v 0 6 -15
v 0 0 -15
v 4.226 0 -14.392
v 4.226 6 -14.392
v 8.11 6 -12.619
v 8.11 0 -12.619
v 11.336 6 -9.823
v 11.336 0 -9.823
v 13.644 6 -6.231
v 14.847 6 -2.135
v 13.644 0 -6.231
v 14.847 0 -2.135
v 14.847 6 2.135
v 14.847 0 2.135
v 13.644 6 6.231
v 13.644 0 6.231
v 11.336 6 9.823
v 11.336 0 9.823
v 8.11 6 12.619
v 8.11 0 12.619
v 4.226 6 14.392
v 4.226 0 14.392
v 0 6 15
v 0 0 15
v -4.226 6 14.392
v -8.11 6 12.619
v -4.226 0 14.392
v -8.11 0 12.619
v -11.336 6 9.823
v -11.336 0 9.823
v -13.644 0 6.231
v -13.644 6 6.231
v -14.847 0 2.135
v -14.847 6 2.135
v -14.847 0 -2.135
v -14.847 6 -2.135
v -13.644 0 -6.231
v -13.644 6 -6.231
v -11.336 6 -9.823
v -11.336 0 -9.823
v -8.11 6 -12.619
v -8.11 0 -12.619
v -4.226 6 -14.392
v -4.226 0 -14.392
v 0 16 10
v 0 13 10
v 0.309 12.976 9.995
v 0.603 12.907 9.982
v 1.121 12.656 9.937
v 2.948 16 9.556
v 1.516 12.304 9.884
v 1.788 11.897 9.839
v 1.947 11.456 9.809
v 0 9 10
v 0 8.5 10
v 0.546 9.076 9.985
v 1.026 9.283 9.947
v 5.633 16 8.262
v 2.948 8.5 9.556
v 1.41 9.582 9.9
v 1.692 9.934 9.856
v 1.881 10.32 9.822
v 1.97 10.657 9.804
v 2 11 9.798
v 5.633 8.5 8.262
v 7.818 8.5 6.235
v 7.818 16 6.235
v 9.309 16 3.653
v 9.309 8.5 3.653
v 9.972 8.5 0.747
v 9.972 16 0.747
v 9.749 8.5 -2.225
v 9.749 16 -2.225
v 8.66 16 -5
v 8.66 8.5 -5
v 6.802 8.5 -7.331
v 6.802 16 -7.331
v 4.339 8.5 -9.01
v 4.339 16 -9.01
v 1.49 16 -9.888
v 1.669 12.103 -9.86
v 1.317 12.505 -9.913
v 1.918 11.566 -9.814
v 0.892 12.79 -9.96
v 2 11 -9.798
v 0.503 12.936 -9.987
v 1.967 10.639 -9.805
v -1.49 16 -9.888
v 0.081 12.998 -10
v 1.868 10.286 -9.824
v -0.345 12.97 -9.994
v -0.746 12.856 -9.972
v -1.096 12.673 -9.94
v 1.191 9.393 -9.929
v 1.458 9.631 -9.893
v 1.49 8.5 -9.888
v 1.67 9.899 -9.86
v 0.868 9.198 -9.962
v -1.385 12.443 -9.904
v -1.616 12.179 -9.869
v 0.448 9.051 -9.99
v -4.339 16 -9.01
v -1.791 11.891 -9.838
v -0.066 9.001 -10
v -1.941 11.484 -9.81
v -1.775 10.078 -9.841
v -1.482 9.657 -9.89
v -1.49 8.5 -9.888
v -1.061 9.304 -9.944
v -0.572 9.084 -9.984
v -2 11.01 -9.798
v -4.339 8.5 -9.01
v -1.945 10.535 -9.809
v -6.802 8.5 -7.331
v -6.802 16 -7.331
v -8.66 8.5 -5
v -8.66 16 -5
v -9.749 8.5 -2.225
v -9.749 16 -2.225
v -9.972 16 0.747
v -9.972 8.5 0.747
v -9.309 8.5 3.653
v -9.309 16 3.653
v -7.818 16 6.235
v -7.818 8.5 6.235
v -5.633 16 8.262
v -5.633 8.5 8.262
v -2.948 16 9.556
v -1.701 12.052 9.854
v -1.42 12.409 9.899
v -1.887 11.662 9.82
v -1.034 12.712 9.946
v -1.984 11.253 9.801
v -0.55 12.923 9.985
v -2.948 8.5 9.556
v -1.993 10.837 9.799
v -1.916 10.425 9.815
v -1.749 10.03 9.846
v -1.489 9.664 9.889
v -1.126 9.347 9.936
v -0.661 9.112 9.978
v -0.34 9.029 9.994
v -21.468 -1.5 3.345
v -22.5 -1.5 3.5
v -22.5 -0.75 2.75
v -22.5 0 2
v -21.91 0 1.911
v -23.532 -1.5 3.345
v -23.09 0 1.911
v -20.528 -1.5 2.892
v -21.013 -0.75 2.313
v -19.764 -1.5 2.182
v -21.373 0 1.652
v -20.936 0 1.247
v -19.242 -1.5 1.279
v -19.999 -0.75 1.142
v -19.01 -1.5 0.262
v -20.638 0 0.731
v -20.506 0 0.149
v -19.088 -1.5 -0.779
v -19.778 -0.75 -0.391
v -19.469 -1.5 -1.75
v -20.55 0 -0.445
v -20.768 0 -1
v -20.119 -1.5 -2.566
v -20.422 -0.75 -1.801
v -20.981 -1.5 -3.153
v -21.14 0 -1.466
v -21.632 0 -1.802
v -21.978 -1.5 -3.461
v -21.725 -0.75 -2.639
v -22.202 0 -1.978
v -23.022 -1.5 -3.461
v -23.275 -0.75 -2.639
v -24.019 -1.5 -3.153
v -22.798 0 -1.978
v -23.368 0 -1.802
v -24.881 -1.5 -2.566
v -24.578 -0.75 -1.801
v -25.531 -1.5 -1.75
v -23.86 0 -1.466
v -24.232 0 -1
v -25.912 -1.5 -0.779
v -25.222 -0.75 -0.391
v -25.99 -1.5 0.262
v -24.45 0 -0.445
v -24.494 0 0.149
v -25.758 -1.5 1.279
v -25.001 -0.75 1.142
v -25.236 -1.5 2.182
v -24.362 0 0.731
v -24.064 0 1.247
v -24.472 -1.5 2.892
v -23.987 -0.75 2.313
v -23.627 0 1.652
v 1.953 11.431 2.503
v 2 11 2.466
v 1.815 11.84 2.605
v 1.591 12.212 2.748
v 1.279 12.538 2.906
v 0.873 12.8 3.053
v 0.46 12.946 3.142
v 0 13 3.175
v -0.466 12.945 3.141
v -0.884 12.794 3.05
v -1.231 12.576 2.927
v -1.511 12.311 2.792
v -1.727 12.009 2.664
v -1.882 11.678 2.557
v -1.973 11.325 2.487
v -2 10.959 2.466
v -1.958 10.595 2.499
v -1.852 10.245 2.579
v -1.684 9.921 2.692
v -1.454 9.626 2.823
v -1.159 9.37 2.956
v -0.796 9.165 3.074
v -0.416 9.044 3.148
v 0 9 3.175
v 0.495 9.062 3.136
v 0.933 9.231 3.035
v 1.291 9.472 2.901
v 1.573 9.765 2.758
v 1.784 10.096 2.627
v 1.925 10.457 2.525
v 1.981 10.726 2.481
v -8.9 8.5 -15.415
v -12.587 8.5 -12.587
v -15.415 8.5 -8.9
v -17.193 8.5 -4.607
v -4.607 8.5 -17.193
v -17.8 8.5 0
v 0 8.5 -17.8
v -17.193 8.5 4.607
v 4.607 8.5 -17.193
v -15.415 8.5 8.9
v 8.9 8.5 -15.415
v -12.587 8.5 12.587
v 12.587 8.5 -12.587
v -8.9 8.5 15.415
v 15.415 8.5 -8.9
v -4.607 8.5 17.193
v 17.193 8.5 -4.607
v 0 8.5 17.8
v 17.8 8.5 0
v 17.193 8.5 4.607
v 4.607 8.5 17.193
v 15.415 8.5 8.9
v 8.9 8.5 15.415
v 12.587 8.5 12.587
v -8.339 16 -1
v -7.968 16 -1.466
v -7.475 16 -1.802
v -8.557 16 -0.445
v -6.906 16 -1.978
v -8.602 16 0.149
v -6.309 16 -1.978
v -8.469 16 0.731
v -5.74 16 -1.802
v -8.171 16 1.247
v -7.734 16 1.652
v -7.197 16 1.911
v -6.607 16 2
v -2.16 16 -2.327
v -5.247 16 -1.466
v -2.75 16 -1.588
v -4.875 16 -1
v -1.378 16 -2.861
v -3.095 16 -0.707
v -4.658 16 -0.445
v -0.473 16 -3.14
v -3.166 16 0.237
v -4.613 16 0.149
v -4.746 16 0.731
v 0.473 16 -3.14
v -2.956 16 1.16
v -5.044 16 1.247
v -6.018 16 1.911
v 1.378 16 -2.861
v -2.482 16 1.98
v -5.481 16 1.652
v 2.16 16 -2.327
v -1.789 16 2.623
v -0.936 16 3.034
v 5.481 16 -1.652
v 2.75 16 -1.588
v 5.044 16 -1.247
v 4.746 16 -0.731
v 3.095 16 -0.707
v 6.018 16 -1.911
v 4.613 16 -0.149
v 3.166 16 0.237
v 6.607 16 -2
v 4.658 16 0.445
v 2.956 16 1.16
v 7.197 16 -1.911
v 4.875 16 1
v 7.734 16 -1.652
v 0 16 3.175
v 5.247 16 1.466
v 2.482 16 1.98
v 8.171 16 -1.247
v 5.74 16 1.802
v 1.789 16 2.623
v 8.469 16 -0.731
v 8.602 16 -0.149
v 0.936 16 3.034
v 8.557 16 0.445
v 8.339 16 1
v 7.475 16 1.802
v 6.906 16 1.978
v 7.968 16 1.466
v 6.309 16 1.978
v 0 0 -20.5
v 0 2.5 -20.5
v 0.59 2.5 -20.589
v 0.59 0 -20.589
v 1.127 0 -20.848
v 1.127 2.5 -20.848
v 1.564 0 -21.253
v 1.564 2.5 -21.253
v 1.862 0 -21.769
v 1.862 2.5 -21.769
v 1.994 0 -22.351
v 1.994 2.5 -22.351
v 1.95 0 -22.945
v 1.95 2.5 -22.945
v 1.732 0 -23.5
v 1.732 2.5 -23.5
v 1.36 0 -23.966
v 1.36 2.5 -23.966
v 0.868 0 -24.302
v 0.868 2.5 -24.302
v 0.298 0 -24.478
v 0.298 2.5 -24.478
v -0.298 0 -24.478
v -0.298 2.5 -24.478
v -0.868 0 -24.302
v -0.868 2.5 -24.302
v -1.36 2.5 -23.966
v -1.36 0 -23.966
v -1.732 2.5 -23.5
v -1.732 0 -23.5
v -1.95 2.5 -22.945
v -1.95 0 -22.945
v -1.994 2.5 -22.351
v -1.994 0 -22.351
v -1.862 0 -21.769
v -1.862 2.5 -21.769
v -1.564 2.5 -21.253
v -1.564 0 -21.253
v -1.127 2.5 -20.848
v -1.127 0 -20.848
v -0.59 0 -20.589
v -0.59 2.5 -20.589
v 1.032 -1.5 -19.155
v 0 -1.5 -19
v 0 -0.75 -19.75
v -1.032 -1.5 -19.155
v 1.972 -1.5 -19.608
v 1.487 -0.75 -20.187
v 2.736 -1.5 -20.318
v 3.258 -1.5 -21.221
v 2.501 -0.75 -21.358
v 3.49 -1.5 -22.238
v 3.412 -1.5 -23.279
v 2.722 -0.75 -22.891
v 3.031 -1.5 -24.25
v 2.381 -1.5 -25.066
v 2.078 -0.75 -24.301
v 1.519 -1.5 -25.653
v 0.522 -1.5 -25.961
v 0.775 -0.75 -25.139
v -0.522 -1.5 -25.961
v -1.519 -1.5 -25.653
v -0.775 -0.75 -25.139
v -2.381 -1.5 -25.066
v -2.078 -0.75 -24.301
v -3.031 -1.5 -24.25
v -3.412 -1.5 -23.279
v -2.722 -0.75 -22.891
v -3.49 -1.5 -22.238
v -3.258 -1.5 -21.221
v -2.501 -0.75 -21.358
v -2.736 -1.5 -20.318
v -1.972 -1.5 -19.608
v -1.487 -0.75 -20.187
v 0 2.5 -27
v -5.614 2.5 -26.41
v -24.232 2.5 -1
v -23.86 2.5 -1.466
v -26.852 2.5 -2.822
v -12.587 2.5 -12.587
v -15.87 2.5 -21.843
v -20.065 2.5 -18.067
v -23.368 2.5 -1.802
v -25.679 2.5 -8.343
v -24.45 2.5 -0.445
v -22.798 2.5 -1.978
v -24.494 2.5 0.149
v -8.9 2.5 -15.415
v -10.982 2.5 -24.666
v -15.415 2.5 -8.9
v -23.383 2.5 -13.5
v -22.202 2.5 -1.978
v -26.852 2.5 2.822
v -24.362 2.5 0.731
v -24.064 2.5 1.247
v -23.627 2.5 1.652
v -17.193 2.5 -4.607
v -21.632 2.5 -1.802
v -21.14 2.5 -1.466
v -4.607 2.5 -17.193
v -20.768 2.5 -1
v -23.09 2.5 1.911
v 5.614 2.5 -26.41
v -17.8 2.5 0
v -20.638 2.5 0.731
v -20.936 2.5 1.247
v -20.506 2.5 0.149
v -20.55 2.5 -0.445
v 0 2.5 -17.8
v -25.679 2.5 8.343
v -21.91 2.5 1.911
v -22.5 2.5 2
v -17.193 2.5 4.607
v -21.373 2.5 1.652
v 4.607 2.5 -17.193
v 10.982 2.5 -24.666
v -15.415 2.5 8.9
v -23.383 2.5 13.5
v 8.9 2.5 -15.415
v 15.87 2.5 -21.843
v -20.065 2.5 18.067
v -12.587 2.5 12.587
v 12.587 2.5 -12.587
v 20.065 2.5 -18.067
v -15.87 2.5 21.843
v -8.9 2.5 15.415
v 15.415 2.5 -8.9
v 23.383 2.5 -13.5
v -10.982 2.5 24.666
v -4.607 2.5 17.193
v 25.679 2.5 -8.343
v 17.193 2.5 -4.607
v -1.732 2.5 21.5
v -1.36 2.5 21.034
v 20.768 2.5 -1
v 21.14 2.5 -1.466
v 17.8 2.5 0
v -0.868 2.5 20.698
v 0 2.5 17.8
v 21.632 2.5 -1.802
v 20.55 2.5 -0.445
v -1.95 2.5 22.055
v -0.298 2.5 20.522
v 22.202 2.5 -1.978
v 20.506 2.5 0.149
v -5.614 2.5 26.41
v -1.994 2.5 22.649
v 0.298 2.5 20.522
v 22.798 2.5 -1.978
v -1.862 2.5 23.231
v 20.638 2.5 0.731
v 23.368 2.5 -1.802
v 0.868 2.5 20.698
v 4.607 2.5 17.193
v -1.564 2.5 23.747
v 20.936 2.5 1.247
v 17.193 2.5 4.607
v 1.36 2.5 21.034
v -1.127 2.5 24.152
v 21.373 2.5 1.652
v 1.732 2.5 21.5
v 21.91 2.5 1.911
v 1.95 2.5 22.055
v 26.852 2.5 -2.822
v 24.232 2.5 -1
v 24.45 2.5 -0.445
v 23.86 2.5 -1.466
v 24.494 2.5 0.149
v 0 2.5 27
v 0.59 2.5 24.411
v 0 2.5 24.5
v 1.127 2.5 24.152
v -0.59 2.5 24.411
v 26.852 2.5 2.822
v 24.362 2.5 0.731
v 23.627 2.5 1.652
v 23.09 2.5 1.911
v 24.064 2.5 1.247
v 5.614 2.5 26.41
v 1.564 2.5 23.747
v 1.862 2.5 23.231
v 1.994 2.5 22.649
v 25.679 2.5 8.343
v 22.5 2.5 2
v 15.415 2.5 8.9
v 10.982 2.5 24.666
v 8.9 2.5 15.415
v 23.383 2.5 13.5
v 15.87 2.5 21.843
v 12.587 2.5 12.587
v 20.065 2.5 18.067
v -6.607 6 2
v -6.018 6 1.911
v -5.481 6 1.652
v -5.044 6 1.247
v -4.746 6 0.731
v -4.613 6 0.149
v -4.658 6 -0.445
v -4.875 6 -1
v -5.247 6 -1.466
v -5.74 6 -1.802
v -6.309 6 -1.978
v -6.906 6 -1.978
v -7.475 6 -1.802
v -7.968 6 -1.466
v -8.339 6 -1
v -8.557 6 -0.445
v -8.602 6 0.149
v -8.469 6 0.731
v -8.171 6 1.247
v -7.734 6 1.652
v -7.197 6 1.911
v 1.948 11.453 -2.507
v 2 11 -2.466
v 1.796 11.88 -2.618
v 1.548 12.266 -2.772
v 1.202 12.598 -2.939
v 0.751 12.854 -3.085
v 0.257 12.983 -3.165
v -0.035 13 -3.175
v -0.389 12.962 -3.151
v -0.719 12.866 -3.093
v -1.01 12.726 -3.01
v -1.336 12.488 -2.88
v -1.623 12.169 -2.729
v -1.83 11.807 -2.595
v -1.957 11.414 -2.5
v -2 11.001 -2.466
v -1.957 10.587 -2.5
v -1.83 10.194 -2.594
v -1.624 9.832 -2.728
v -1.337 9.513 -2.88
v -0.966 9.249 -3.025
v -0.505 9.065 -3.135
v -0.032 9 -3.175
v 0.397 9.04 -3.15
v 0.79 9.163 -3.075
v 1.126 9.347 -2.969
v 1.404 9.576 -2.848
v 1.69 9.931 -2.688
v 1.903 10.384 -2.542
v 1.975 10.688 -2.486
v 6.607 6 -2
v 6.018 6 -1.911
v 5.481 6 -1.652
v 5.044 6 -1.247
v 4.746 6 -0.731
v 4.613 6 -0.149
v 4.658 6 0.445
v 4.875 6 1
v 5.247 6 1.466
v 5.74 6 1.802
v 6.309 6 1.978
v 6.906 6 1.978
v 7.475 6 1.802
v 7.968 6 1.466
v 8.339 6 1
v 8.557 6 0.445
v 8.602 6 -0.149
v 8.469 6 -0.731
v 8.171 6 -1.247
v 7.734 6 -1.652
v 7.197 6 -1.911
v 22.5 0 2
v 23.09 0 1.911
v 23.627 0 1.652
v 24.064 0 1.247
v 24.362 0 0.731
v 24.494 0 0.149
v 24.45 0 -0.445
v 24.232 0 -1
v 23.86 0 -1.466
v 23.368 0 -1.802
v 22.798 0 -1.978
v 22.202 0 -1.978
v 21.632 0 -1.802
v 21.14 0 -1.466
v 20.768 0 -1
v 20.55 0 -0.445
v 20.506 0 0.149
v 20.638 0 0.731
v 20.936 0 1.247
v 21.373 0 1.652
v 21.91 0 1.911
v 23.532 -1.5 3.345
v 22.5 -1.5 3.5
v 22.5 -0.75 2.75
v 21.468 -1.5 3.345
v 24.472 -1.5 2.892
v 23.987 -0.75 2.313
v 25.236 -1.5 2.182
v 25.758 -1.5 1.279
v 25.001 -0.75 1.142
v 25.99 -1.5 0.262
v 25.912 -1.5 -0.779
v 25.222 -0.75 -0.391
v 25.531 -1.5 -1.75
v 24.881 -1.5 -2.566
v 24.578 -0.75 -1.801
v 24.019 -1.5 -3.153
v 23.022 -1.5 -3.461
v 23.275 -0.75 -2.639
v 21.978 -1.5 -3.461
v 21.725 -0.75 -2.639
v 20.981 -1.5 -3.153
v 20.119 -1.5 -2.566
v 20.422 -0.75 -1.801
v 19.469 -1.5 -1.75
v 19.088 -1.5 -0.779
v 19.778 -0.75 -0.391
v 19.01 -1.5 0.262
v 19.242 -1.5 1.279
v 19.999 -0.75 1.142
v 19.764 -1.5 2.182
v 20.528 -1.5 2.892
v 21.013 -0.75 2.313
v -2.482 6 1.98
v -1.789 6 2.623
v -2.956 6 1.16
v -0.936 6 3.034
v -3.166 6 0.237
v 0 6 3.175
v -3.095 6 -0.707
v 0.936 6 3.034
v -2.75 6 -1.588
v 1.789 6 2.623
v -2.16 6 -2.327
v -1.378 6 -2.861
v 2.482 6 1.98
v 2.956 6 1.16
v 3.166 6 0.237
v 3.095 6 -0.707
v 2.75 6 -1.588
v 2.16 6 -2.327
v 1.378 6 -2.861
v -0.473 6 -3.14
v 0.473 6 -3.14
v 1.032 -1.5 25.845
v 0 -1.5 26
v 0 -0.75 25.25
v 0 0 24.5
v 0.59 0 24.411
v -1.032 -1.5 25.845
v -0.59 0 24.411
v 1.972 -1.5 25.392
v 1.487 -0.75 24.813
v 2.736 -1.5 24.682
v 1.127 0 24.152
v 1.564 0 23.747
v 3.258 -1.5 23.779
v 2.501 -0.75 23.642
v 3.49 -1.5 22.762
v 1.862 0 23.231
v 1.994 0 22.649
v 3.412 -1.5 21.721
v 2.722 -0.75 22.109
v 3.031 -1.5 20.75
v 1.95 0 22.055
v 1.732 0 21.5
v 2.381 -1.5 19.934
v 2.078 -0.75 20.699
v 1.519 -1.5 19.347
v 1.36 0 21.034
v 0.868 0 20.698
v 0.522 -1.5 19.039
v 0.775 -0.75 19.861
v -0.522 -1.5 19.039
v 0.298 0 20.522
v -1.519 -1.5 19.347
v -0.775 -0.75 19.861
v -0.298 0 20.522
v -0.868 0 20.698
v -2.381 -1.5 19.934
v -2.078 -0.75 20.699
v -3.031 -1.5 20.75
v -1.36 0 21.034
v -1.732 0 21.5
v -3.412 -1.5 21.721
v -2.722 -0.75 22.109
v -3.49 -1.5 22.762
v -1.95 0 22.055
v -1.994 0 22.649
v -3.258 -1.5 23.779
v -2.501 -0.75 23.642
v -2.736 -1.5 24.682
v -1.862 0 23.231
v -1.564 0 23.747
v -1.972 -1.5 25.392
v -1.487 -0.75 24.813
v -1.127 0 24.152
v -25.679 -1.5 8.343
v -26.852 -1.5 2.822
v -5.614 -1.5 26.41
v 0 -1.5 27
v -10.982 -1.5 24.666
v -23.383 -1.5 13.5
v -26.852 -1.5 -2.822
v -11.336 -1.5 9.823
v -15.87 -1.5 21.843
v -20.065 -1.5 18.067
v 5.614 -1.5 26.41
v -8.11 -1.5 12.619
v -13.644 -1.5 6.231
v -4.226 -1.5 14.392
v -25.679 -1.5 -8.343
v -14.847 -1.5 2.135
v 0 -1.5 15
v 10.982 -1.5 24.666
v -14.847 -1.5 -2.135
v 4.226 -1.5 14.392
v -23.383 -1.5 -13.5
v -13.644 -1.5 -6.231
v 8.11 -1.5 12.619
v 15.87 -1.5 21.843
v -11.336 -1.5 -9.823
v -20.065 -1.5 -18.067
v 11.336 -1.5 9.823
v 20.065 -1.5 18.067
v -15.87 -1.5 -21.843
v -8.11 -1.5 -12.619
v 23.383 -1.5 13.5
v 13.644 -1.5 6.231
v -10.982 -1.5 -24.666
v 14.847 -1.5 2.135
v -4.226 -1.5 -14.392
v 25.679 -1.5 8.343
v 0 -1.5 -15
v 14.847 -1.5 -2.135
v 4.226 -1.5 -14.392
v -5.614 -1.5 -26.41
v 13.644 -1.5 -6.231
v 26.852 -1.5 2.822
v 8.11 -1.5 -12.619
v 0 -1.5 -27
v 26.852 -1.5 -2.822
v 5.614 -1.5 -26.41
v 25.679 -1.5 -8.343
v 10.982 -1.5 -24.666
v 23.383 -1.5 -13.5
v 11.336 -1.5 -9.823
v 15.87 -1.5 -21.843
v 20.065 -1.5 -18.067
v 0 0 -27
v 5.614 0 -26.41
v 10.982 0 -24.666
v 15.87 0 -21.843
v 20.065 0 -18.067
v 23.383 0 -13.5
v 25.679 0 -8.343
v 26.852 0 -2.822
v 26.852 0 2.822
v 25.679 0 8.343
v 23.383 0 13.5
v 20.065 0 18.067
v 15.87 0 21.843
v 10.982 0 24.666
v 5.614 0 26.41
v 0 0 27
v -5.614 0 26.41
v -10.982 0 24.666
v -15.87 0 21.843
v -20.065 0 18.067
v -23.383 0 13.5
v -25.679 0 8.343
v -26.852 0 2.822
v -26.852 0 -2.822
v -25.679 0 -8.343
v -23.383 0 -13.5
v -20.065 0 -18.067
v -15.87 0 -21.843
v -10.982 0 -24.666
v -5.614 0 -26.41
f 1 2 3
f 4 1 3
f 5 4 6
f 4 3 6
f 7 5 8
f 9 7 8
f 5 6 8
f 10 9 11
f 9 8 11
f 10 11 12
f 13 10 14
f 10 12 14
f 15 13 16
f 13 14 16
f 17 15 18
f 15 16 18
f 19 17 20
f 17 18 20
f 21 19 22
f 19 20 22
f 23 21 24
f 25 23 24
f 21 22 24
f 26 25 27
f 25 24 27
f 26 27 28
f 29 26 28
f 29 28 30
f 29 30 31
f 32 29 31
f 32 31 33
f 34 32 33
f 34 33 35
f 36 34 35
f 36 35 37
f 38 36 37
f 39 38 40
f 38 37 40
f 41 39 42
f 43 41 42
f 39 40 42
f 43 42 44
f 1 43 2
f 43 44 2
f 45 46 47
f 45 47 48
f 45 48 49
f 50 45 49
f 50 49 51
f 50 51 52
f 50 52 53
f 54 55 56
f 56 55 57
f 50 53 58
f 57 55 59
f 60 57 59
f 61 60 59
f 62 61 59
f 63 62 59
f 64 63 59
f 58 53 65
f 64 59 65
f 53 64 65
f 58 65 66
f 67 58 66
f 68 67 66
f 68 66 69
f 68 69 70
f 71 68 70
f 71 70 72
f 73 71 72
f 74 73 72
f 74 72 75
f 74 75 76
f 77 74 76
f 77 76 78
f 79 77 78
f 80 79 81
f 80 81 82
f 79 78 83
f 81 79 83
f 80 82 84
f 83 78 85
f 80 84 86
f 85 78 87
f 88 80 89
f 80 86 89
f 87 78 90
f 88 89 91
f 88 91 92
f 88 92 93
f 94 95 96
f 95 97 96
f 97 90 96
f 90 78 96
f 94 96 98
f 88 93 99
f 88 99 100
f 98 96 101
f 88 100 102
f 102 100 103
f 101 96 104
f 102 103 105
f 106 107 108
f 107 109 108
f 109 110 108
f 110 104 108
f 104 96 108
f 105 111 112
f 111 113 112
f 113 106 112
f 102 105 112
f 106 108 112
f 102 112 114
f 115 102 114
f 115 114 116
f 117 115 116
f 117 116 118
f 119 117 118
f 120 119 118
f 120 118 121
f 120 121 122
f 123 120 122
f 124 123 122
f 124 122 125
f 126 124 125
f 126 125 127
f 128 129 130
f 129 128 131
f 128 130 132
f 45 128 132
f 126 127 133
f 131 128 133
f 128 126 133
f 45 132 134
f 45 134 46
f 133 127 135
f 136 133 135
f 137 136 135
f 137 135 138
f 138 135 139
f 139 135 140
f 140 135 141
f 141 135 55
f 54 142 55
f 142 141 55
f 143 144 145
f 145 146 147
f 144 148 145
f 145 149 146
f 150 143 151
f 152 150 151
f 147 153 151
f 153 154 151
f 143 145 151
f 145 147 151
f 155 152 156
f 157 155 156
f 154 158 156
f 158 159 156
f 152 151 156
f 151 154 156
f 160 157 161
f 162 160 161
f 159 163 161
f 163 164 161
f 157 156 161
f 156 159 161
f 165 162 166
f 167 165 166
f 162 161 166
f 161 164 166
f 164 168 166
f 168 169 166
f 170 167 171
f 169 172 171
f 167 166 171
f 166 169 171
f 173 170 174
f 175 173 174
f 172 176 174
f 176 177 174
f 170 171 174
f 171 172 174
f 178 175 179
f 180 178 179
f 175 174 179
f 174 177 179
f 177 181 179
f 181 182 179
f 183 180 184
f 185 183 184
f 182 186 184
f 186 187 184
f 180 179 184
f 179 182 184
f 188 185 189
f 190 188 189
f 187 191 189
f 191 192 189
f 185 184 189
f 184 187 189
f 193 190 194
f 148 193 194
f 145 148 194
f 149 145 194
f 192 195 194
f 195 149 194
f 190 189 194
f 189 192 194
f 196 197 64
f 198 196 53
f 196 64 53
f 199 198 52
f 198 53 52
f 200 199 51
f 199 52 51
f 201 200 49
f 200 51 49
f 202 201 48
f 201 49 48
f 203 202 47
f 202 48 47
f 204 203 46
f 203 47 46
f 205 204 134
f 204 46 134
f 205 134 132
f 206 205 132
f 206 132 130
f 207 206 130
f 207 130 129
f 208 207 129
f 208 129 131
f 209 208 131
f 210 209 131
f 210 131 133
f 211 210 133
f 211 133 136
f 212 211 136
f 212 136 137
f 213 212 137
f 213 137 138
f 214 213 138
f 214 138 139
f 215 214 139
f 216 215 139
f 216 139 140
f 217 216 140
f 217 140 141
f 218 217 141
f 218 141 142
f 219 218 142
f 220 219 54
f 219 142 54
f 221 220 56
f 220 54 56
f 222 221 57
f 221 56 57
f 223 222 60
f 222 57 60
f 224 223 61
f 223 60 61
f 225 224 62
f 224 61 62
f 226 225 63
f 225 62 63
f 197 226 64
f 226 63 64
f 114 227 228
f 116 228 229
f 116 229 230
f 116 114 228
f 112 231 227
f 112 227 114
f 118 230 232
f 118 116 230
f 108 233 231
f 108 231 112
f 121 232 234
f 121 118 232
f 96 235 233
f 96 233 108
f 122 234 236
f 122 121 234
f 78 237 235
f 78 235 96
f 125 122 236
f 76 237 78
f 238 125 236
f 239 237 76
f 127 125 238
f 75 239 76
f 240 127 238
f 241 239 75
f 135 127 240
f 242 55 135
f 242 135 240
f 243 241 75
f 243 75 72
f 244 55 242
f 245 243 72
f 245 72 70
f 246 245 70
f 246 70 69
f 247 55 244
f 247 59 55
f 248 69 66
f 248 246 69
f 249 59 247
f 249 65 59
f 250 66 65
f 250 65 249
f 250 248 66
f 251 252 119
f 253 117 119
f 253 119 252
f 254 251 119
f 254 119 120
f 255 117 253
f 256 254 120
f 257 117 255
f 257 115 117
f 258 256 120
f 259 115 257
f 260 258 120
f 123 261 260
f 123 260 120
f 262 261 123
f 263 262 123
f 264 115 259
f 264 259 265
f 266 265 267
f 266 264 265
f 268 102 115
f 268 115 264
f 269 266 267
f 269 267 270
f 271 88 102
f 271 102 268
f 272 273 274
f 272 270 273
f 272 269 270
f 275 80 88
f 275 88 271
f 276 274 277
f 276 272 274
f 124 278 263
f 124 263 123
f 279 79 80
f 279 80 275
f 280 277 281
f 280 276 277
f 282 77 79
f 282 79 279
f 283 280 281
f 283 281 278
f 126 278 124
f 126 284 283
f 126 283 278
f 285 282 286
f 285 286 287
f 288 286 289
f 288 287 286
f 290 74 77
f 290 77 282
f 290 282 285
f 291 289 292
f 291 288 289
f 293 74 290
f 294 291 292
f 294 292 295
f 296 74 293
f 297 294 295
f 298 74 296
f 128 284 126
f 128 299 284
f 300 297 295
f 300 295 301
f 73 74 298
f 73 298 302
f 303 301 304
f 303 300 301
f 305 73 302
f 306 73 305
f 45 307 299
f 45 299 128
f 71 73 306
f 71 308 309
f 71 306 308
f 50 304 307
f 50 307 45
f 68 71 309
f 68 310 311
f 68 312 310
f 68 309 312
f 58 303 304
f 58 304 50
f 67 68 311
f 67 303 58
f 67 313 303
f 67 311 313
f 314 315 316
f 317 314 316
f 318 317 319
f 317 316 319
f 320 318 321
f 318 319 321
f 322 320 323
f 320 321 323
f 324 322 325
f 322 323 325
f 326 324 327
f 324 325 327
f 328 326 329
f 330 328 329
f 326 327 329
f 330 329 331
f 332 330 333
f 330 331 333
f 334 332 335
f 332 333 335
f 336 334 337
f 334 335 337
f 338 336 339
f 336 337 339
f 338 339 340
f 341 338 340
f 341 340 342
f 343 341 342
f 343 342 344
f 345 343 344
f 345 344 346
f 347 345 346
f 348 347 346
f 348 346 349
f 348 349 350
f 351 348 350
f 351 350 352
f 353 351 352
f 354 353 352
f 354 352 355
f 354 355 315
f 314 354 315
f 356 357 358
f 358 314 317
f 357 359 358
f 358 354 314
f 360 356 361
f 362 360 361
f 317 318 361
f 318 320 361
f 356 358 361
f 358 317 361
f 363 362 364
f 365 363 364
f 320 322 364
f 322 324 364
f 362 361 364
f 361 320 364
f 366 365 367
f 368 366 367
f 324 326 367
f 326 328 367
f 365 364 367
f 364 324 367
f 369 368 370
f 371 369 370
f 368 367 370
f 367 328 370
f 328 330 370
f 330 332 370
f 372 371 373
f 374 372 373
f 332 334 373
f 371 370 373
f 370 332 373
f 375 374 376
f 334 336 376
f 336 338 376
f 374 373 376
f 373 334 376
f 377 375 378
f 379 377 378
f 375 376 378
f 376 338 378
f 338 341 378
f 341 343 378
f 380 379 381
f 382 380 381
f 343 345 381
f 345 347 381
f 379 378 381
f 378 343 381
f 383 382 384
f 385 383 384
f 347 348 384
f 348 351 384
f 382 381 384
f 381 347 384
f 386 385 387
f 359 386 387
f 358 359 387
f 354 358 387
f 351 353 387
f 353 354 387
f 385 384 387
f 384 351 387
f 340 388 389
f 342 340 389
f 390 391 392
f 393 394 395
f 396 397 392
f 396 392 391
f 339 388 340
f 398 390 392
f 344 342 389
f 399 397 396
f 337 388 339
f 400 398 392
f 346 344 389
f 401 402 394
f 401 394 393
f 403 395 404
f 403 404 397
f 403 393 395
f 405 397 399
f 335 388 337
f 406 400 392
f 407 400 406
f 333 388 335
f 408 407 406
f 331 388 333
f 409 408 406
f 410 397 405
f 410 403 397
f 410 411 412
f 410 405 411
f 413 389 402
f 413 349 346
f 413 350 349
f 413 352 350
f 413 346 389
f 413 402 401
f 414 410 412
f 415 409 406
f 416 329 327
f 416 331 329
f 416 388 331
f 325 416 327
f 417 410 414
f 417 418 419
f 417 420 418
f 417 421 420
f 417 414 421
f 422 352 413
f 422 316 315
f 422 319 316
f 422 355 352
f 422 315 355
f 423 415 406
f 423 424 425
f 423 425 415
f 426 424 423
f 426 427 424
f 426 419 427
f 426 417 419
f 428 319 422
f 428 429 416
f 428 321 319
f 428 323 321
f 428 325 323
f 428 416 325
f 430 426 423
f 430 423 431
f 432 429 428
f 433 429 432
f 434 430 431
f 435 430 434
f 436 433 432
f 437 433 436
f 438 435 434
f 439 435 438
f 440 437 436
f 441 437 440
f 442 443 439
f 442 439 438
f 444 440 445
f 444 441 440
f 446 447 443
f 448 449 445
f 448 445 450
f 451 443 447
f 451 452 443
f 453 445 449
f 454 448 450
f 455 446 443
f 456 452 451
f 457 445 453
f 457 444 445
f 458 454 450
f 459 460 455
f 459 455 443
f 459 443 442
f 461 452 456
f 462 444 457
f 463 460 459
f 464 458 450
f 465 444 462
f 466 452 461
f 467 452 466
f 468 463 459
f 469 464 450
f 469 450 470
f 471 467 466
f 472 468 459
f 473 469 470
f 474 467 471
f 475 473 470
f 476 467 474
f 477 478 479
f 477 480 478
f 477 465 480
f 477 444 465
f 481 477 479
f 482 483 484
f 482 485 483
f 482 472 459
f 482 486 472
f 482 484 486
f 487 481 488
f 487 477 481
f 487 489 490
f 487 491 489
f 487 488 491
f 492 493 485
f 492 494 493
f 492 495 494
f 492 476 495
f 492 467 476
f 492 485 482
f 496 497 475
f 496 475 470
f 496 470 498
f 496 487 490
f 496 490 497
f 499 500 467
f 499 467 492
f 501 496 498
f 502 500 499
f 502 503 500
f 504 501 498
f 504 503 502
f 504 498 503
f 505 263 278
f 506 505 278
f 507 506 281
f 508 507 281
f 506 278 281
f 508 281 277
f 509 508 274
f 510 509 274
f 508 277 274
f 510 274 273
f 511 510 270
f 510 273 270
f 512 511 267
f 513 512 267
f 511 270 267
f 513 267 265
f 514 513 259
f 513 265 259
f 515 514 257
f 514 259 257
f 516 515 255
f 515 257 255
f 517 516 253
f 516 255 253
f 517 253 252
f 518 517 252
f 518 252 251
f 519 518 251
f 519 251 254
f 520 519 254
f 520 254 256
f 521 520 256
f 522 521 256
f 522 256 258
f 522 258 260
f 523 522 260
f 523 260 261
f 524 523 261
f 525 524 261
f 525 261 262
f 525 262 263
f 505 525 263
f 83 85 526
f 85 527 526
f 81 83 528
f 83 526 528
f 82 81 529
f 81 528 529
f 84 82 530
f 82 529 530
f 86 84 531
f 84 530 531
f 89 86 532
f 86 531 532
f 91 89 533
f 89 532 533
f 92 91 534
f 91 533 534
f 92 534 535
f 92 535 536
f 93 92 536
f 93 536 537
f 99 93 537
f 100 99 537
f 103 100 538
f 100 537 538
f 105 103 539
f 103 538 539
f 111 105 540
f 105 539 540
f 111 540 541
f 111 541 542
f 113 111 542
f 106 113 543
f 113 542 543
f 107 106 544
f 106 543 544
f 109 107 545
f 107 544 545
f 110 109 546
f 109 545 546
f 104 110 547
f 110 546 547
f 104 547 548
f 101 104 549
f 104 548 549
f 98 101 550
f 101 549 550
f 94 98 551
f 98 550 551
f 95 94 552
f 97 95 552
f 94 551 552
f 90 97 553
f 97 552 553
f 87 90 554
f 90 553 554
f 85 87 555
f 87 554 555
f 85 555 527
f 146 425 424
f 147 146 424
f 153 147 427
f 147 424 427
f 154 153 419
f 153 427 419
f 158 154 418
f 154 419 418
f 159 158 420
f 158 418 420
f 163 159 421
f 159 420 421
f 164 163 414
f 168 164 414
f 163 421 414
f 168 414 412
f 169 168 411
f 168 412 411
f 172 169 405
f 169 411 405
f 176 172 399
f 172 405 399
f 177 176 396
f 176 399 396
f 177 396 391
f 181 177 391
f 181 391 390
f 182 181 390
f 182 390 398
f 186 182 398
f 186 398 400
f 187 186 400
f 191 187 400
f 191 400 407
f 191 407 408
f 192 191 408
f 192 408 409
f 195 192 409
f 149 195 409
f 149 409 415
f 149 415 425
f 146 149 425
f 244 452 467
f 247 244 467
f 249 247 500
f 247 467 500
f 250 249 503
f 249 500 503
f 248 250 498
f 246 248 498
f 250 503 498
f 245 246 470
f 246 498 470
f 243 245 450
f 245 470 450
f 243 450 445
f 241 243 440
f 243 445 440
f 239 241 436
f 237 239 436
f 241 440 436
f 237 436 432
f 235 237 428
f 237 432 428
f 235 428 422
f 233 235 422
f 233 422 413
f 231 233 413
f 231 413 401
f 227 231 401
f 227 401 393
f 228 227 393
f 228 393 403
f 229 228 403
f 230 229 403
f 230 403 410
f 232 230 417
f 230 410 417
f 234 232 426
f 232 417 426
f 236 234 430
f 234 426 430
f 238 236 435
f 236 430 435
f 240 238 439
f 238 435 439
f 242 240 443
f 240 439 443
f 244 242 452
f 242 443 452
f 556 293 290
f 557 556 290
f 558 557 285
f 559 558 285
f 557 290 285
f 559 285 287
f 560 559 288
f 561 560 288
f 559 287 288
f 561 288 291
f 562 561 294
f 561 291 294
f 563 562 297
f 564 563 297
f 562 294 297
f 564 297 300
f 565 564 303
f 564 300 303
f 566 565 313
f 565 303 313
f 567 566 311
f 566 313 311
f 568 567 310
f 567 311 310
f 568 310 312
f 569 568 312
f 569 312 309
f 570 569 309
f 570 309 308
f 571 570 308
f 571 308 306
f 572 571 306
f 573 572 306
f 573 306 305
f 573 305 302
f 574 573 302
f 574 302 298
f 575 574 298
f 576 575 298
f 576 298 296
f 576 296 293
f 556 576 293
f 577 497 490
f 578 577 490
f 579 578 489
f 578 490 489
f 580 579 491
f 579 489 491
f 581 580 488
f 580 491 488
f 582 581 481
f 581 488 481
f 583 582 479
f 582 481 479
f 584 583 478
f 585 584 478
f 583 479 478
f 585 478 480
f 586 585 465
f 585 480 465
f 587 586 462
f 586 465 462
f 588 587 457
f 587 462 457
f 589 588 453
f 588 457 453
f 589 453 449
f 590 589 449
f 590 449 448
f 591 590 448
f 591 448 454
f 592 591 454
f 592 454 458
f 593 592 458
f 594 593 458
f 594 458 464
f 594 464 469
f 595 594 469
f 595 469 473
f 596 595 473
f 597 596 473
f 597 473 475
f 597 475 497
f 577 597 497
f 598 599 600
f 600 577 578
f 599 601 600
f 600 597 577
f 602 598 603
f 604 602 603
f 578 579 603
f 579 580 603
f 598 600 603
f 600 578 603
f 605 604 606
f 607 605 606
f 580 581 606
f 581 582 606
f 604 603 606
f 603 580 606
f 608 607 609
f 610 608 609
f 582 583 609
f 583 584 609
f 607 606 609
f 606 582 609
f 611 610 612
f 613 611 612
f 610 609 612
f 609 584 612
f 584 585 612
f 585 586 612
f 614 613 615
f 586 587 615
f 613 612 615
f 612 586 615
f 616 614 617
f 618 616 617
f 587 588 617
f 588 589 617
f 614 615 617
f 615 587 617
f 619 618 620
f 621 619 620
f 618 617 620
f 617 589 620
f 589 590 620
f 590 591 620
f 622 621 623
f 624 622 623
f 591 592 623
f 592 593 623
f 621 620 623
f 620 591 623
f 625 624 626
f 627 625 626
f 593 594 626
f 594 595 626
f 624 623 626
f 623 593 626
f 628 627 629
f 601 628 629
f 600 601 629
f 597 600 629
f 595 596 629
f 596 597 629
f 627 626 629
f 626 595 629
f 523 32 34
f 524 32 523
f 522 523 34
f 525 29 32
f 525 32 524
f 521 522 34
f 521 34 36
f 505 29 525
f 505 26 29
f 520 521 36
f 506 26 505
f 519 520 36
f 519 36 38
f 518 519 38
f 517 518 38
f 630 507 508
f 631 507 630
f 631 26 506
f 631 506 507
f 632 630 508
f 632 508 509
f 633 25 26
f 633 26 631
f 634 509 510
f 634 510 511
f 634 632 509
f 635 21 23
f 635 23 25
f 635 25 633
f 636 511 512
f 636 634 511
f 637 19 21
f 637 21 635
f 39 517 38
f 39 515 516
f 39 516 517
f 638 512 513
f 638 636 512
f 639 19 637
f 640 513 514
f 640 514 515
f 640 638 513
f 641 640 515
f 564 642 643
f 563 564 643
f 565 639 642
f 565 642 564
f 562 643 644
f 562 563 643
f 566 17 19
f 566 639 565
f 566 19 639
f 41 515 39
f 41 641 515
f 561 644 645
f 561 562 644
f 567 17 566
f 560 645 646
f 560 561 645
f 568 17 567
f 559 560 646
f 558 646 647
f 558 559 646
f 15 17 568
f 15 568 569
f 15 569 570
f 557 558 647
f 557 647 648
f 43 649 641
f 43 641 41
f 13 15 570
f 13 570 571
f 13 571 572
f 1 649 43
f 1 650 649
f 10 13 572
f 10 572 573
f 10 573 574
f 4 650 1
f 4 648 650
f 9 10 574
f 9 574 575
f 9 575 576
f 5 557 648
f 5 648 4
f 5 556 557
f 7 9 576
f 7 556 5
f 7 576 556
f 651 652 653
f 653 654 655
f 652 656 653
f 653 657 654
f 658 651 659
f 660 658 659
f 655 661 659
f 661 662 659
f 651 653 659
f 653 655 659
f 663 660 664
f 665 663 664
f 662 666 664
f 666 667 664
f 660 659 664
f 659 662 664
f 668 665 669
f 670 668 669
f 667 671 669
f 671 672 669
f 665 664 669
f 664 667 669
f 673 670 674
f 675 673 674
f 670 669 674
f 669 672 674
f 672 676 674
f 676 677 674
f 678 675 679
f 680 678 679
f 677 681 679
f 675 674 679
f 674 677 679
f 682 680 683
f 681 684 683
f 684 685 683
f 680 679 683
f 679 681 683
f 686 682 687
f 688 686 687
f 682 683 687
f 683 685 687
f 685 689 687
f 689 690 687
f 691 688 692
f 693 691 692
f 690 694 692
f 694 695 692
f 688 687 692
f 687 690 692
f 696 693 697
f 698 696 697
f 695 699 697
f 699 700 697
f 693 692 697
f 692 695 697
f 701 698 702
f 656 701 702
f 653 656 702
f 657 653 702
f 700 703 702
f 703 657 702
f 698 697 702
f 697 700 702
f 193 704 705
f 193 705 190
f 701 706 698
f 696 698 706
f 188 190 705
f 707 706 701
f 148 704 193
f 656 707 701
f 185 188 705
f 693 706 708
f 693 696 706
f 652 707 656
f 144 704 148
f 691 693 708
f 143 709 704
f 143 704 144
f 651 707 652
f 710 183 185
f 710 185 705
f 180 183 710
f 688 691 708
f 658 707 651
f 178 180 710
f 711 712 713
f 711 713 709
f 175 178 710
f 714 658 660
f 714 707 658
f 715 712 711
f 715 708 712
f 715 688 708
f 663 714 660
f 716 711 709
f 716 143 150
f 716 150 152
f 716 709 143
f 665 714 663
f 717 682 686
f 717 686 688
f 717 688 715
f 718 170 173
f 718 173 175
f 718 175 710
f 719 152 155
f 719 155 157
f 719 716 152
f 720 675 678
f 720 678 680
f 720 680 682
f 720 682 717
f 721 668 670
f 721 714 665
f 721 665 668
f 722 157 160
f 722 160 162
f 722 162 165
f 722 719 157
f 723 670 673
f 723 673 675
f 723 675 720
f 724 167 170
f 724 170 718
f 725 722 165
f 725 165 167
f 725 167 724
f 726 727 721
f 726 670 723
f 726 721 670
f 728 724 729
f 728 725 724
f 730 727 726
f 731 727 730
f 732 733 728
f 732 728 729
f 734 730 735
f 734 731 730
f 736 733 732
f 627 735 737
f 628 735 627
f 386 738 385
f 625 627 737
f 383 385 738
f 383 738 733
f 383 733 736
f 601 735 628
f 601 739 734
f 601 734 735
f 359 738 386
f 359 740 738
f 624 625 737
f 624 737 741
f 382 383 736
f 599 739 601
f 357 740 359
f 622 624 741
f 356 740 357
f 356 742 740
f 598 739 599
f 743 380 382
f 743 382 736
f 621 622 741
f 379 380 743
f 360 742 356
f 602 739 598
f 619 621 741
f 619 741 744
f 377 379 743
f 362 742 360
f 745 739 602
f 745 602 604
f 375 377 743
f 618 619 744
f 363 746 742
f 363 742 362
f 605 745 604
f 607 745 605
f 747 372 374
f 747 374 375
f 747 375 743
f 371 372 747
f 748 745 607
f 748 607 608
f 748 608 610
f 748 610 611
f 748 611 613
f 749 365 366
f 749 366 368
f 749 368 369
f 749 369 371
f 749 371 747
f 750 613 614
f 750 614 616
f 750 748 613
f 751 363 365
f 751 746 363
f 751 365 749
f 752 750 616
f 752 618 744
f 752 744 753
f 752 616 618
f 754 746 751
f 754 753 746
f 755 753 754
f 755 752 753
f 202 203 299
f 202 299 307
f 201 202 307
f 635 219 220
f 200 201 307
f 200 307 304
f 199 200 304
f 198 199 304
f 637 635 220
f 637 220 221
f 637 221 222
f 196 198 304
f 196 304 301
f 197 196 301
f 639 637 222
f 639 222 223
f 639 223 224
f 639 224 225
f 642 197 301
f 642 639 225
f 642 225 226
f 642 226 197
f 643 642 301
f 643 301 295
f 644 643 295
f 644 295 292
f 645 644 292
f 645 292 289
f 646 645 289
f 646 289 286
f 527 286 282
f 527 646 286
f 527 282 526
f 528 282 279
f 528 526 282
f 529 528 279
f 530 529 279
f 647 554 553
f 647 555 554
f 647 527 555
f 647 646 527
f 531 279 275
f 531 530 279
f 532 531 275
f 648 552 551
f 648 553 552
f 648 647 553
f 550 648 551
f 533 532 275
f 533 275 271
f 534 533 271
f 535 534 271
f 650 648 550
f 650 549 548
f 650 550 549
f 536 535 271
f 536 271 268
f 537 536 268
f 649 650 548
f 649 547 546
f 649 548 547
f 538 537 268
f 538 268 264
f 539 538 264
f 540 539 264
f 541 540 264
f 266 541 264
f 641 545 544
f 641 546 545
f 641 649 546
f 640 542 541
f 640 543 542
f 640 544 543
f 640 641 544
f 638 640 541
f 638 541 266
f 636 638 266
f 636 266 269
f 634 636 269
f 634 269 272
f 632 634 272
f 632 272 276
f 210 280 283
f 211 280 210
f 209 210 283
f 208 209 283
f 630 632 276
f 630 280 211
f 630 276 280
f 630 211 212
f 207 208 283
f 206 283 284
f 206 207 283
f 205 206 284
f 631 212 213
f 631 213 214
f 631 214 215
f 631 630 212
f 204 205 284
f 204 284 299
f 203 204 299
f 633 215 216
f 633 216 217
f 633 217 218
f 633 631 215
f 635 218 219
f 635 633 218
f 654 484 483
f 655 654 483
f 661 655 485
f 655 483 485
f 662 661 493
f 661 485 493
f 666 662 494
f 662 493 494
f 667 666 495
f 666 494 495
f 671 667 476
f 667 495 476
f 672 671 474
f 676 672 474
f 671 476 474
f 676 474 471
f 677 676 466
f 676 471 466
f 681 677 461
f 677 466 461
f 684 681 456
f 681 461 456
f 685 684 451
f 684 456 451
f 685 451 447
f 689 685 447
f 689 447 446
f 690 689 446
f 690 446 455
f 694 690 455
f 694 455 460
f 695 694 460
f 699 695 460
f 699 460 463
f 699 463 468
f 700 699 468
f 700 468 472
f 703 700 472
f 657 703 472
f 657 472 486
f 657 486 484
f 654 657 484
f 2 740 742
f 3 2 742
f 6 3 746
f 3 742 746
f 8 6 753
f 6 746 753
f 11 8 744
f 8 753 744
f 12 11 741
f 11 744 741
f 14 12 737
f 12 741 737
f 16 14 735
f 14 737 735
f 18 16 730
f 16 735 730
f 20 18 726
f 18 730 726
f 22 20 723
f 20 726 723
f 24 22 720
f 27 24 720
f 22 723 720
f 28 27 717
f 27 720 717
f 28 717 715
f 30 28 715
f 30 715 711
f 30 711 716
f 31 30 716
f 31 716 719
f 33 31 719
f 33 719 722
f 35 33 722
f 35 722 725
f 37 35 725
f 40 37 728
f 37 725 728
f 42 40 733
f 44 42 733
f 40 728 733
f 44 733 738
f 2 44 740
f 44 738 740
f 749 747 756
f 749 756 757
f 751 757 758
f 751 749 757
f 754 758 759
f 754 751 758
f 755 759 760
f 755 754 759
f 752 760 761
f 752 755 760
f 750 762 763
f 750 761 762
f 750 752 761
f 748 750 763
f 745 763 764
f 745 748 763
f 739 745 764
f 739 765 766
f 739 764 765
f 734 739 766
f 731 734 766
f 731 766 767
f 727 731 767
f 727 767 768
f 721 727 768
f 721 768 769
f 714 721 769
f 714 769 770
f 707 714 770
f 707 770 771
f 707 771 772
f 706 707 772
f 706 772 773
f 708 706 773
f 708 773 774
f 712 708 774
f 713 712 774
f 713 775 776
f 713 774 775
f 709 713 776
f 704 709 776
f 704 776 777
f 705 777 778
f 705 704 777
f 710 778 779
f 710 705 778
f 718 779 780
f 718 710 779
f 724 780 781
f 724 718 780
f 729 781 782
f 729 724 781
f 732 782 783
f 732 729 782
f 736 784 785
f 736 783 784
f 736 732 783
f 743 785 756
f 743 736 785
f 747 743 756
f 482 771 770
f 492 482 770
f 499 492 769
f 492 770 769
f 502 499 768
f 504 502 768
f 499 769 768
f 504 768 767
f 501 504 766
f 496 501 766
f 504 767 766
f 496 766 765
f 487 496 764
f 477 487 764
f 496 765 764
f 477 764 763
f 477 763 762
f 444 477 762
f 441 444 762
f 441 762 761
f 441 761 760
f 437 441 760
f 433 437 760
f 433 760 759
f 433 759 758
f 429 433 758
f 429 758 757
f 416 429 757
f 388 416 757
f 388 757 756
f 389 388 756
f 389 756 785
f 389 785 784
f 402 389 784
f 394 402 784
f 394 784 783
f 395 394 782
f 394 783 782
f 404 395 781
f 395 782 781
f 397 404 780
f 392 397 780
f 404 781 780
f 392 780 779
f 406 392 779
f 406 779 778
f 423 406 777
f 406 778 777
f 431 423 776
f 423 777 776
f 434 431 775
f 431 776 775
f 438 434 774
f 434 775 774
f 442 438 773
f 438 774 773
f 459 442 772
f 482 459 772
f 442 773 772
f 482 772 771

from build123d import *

# Parameters (mm, degrees)
SKETCH_1_R          = 27
SKETCH_1_R_2        = 3.175
EXTRUDE_1_DEPTH     = 16
CUT_EXTRUDE_START   = -7.5
SKETCH_2_R          = 27
SKETCH_2_R_2        = 10
CUT_EXTRUDE_1_DEPTH = 7.5
SKETCH_3_R          = 15
CUT_EXTRUDE_2_DEPTH = 6
CUT_EXTRUDE_START_2 = -6
SKETCH_4_R          = 27
SKETCH_4_R_2        = 17.8
CUT_EXTRUDE_3_DEPTH = 6
SKETCH_5_R          = 2
CUT_EXTRUDE_4_DEPTH = 16.25
EXTRUDE_START       = 1.5
SKETCH_6_R          = 27
SKETCH_6_R_2        = 15
EXTRUDE_5_DEPTH     = 1.5
SKETCH_7_R          = 2
CUT_EXTRUDE_6_DEPTH = 41.500000033
CHAMFER_1_SIZE      = 1.5
SKETCH_8_R          = 2
CUT_EXTRUDE_7_DEPTH = 43.002976085


with BuildPart() as part:
    # Эскиз1 → Вытянуть1 (new body)
    with BuildSketch(Plane(origin=(0, 0, 0), x_dir=(1, 0, 0), z_dir=(0, 1, 0))):
        with Locations(Location((0, 0, 0), (0, 0, 270))):
            Circle(SKETCH_1_R)
        with Locations(Location((0, 0, 0), (0, 0, 270))):
            Circle(SKETCH_1_R_2, mode=Mode.SUBTRACT)
    extrude(amount=EXTRUDE_1_DEPTH)

    # Эскиз2 → Вырез-Вытянуть1 (cut)
    with BuildSketch(Plane(origin=(0, 16, 0), x_dir=(1, 0, 0), z_dir=(0, 1, 0)).offset(CUT_EXTRUDE_START)):
        with Locations(Location((0, 0, 0), (0, 0, 270))):
            Circle(SKETCH_2_R)
        with Locations(Location((0, 0, 0), (0, 0, 270))):
            Circle(SKETCH_2_R_2, mode=Mode.SUBTRACT)
    extrude(amount=CUT_EXTRUDE_1_DEPTH, mode=Mode.SUBTRACT)

    # Эскиз3 → Вытянуть2 (cut)
    with BuildSketch(Plane.XZ):
        with Locations(Location((0, 0, 0), (0, 0, 270))):
            Circle(SKETCH_3_R)
    extrude(amount=-CUT_EXTRUDE_2_DEPTH, mode=Mode.SUBTRACT)

    # Эскиз4 → Вытянуть3 (cut)
    with BuildSketch(Plane(origin=(0, 8.5, 0), x_dir=(1, 0, 0), z_dir=(0, 1, 0)).offset(CUT_EXTRUDE_START_2)):
        with Locations(Location((0, 0, 0), (0, 0, 270))):
            Circle(SKETCH_4_R)
        with Locations(Location((0, 0, 0), (0, 0, 270))):
            Circle(SKETCH_4_R_2, mode=Mode.SUBTRACT)
    extrude(amount=CUT_EXTRUDE_3_DEPTH, mode=Mode.SUBTRACT)

    # Эскиз5 → Вытянуть4 (cut, symmetric)
    with BuildSketch(Plane.XY):
        with Locations((0, 11)):
            Circle(SKETCH_5_R)
    extrude(amount=CUT_EXTRUDE_4_DEPTH, both=True, mode=Mode.SUBTRACT)

    # Эскиз6 → Вытянуть5 (add)
    with BuildSketch(Plane.XZ.offset(EXTRUDE_START)):
        with Locations(Location((0, 0, 0), (0, 0, 270))):
            Circle(SKETCH_6_R)
        with Locations(Location((0, 0, 0), (0, 0, 270))):
            Circle(SKETCH_6_R_2, mode=Mode.SUBTRACT)
    extrude(amount=-EXTRUDE_5_DEPTH)

    # Эскиз7 → Вытянуть6 (cut, through all)
    with BuildSketch(Plane(origin=(0, 2.5, 0), x_dir=(1, 0, 0), z_dir=(0, 1, 0))):
        with Locations(Location((0, 22.5, 0), (0, 0, 270))):
            Circle(SKETCH_7_R)
        with Locations(Location((22.5, 0, 0), (0, 0, 270))):
            Circle(SKETCH_7_R)
        with Locations(Location((0, -22.5, 0), (0, 0, 270))):
            Circle(SKETCH_7_R)
        with Locations(Location((-22.5, 0, 0), (0, 0, 270))):
            Circle(SKETCH_7_R)
    extrude(amount=-CUT_EXTRUDE_6_DEPTH, mode=Mode.SUBTRACT)

    # Фаска1
    chamfer_1_edges = [part.edges().sort_by_distance(p)[0] for p in [
        (0, -1.5, -24.5),
        (22.5, -1.5, -2),
        (0, -1.5, 20.5),
        (-22.5, -1.5, -2),
    ]]
    chamfer(chamfer_1_edges, length=CHAMFER_1_SIZE)

    # Эскиз8 → Вытянуть7 (cut, through all)
    with BuildSketch(Plane(origin=(0, 16, 0), x_dir=(1, 0, 0), z_dir=(0, 1, 0))):
        with Locations(Location((-6.60744303, 0, 0), (0, 0, 270))):
            Circle(SKETCH_8_R)
        with Locations(Location((6.60744303, 0, 0), (0, 0, 90))):
            Circle(SKETCH_8_R)
    extrude(amount=-CUT_EXTRUDE_7_DEPTH, mode=Mode.SUBTRACT)


solid = part.part
